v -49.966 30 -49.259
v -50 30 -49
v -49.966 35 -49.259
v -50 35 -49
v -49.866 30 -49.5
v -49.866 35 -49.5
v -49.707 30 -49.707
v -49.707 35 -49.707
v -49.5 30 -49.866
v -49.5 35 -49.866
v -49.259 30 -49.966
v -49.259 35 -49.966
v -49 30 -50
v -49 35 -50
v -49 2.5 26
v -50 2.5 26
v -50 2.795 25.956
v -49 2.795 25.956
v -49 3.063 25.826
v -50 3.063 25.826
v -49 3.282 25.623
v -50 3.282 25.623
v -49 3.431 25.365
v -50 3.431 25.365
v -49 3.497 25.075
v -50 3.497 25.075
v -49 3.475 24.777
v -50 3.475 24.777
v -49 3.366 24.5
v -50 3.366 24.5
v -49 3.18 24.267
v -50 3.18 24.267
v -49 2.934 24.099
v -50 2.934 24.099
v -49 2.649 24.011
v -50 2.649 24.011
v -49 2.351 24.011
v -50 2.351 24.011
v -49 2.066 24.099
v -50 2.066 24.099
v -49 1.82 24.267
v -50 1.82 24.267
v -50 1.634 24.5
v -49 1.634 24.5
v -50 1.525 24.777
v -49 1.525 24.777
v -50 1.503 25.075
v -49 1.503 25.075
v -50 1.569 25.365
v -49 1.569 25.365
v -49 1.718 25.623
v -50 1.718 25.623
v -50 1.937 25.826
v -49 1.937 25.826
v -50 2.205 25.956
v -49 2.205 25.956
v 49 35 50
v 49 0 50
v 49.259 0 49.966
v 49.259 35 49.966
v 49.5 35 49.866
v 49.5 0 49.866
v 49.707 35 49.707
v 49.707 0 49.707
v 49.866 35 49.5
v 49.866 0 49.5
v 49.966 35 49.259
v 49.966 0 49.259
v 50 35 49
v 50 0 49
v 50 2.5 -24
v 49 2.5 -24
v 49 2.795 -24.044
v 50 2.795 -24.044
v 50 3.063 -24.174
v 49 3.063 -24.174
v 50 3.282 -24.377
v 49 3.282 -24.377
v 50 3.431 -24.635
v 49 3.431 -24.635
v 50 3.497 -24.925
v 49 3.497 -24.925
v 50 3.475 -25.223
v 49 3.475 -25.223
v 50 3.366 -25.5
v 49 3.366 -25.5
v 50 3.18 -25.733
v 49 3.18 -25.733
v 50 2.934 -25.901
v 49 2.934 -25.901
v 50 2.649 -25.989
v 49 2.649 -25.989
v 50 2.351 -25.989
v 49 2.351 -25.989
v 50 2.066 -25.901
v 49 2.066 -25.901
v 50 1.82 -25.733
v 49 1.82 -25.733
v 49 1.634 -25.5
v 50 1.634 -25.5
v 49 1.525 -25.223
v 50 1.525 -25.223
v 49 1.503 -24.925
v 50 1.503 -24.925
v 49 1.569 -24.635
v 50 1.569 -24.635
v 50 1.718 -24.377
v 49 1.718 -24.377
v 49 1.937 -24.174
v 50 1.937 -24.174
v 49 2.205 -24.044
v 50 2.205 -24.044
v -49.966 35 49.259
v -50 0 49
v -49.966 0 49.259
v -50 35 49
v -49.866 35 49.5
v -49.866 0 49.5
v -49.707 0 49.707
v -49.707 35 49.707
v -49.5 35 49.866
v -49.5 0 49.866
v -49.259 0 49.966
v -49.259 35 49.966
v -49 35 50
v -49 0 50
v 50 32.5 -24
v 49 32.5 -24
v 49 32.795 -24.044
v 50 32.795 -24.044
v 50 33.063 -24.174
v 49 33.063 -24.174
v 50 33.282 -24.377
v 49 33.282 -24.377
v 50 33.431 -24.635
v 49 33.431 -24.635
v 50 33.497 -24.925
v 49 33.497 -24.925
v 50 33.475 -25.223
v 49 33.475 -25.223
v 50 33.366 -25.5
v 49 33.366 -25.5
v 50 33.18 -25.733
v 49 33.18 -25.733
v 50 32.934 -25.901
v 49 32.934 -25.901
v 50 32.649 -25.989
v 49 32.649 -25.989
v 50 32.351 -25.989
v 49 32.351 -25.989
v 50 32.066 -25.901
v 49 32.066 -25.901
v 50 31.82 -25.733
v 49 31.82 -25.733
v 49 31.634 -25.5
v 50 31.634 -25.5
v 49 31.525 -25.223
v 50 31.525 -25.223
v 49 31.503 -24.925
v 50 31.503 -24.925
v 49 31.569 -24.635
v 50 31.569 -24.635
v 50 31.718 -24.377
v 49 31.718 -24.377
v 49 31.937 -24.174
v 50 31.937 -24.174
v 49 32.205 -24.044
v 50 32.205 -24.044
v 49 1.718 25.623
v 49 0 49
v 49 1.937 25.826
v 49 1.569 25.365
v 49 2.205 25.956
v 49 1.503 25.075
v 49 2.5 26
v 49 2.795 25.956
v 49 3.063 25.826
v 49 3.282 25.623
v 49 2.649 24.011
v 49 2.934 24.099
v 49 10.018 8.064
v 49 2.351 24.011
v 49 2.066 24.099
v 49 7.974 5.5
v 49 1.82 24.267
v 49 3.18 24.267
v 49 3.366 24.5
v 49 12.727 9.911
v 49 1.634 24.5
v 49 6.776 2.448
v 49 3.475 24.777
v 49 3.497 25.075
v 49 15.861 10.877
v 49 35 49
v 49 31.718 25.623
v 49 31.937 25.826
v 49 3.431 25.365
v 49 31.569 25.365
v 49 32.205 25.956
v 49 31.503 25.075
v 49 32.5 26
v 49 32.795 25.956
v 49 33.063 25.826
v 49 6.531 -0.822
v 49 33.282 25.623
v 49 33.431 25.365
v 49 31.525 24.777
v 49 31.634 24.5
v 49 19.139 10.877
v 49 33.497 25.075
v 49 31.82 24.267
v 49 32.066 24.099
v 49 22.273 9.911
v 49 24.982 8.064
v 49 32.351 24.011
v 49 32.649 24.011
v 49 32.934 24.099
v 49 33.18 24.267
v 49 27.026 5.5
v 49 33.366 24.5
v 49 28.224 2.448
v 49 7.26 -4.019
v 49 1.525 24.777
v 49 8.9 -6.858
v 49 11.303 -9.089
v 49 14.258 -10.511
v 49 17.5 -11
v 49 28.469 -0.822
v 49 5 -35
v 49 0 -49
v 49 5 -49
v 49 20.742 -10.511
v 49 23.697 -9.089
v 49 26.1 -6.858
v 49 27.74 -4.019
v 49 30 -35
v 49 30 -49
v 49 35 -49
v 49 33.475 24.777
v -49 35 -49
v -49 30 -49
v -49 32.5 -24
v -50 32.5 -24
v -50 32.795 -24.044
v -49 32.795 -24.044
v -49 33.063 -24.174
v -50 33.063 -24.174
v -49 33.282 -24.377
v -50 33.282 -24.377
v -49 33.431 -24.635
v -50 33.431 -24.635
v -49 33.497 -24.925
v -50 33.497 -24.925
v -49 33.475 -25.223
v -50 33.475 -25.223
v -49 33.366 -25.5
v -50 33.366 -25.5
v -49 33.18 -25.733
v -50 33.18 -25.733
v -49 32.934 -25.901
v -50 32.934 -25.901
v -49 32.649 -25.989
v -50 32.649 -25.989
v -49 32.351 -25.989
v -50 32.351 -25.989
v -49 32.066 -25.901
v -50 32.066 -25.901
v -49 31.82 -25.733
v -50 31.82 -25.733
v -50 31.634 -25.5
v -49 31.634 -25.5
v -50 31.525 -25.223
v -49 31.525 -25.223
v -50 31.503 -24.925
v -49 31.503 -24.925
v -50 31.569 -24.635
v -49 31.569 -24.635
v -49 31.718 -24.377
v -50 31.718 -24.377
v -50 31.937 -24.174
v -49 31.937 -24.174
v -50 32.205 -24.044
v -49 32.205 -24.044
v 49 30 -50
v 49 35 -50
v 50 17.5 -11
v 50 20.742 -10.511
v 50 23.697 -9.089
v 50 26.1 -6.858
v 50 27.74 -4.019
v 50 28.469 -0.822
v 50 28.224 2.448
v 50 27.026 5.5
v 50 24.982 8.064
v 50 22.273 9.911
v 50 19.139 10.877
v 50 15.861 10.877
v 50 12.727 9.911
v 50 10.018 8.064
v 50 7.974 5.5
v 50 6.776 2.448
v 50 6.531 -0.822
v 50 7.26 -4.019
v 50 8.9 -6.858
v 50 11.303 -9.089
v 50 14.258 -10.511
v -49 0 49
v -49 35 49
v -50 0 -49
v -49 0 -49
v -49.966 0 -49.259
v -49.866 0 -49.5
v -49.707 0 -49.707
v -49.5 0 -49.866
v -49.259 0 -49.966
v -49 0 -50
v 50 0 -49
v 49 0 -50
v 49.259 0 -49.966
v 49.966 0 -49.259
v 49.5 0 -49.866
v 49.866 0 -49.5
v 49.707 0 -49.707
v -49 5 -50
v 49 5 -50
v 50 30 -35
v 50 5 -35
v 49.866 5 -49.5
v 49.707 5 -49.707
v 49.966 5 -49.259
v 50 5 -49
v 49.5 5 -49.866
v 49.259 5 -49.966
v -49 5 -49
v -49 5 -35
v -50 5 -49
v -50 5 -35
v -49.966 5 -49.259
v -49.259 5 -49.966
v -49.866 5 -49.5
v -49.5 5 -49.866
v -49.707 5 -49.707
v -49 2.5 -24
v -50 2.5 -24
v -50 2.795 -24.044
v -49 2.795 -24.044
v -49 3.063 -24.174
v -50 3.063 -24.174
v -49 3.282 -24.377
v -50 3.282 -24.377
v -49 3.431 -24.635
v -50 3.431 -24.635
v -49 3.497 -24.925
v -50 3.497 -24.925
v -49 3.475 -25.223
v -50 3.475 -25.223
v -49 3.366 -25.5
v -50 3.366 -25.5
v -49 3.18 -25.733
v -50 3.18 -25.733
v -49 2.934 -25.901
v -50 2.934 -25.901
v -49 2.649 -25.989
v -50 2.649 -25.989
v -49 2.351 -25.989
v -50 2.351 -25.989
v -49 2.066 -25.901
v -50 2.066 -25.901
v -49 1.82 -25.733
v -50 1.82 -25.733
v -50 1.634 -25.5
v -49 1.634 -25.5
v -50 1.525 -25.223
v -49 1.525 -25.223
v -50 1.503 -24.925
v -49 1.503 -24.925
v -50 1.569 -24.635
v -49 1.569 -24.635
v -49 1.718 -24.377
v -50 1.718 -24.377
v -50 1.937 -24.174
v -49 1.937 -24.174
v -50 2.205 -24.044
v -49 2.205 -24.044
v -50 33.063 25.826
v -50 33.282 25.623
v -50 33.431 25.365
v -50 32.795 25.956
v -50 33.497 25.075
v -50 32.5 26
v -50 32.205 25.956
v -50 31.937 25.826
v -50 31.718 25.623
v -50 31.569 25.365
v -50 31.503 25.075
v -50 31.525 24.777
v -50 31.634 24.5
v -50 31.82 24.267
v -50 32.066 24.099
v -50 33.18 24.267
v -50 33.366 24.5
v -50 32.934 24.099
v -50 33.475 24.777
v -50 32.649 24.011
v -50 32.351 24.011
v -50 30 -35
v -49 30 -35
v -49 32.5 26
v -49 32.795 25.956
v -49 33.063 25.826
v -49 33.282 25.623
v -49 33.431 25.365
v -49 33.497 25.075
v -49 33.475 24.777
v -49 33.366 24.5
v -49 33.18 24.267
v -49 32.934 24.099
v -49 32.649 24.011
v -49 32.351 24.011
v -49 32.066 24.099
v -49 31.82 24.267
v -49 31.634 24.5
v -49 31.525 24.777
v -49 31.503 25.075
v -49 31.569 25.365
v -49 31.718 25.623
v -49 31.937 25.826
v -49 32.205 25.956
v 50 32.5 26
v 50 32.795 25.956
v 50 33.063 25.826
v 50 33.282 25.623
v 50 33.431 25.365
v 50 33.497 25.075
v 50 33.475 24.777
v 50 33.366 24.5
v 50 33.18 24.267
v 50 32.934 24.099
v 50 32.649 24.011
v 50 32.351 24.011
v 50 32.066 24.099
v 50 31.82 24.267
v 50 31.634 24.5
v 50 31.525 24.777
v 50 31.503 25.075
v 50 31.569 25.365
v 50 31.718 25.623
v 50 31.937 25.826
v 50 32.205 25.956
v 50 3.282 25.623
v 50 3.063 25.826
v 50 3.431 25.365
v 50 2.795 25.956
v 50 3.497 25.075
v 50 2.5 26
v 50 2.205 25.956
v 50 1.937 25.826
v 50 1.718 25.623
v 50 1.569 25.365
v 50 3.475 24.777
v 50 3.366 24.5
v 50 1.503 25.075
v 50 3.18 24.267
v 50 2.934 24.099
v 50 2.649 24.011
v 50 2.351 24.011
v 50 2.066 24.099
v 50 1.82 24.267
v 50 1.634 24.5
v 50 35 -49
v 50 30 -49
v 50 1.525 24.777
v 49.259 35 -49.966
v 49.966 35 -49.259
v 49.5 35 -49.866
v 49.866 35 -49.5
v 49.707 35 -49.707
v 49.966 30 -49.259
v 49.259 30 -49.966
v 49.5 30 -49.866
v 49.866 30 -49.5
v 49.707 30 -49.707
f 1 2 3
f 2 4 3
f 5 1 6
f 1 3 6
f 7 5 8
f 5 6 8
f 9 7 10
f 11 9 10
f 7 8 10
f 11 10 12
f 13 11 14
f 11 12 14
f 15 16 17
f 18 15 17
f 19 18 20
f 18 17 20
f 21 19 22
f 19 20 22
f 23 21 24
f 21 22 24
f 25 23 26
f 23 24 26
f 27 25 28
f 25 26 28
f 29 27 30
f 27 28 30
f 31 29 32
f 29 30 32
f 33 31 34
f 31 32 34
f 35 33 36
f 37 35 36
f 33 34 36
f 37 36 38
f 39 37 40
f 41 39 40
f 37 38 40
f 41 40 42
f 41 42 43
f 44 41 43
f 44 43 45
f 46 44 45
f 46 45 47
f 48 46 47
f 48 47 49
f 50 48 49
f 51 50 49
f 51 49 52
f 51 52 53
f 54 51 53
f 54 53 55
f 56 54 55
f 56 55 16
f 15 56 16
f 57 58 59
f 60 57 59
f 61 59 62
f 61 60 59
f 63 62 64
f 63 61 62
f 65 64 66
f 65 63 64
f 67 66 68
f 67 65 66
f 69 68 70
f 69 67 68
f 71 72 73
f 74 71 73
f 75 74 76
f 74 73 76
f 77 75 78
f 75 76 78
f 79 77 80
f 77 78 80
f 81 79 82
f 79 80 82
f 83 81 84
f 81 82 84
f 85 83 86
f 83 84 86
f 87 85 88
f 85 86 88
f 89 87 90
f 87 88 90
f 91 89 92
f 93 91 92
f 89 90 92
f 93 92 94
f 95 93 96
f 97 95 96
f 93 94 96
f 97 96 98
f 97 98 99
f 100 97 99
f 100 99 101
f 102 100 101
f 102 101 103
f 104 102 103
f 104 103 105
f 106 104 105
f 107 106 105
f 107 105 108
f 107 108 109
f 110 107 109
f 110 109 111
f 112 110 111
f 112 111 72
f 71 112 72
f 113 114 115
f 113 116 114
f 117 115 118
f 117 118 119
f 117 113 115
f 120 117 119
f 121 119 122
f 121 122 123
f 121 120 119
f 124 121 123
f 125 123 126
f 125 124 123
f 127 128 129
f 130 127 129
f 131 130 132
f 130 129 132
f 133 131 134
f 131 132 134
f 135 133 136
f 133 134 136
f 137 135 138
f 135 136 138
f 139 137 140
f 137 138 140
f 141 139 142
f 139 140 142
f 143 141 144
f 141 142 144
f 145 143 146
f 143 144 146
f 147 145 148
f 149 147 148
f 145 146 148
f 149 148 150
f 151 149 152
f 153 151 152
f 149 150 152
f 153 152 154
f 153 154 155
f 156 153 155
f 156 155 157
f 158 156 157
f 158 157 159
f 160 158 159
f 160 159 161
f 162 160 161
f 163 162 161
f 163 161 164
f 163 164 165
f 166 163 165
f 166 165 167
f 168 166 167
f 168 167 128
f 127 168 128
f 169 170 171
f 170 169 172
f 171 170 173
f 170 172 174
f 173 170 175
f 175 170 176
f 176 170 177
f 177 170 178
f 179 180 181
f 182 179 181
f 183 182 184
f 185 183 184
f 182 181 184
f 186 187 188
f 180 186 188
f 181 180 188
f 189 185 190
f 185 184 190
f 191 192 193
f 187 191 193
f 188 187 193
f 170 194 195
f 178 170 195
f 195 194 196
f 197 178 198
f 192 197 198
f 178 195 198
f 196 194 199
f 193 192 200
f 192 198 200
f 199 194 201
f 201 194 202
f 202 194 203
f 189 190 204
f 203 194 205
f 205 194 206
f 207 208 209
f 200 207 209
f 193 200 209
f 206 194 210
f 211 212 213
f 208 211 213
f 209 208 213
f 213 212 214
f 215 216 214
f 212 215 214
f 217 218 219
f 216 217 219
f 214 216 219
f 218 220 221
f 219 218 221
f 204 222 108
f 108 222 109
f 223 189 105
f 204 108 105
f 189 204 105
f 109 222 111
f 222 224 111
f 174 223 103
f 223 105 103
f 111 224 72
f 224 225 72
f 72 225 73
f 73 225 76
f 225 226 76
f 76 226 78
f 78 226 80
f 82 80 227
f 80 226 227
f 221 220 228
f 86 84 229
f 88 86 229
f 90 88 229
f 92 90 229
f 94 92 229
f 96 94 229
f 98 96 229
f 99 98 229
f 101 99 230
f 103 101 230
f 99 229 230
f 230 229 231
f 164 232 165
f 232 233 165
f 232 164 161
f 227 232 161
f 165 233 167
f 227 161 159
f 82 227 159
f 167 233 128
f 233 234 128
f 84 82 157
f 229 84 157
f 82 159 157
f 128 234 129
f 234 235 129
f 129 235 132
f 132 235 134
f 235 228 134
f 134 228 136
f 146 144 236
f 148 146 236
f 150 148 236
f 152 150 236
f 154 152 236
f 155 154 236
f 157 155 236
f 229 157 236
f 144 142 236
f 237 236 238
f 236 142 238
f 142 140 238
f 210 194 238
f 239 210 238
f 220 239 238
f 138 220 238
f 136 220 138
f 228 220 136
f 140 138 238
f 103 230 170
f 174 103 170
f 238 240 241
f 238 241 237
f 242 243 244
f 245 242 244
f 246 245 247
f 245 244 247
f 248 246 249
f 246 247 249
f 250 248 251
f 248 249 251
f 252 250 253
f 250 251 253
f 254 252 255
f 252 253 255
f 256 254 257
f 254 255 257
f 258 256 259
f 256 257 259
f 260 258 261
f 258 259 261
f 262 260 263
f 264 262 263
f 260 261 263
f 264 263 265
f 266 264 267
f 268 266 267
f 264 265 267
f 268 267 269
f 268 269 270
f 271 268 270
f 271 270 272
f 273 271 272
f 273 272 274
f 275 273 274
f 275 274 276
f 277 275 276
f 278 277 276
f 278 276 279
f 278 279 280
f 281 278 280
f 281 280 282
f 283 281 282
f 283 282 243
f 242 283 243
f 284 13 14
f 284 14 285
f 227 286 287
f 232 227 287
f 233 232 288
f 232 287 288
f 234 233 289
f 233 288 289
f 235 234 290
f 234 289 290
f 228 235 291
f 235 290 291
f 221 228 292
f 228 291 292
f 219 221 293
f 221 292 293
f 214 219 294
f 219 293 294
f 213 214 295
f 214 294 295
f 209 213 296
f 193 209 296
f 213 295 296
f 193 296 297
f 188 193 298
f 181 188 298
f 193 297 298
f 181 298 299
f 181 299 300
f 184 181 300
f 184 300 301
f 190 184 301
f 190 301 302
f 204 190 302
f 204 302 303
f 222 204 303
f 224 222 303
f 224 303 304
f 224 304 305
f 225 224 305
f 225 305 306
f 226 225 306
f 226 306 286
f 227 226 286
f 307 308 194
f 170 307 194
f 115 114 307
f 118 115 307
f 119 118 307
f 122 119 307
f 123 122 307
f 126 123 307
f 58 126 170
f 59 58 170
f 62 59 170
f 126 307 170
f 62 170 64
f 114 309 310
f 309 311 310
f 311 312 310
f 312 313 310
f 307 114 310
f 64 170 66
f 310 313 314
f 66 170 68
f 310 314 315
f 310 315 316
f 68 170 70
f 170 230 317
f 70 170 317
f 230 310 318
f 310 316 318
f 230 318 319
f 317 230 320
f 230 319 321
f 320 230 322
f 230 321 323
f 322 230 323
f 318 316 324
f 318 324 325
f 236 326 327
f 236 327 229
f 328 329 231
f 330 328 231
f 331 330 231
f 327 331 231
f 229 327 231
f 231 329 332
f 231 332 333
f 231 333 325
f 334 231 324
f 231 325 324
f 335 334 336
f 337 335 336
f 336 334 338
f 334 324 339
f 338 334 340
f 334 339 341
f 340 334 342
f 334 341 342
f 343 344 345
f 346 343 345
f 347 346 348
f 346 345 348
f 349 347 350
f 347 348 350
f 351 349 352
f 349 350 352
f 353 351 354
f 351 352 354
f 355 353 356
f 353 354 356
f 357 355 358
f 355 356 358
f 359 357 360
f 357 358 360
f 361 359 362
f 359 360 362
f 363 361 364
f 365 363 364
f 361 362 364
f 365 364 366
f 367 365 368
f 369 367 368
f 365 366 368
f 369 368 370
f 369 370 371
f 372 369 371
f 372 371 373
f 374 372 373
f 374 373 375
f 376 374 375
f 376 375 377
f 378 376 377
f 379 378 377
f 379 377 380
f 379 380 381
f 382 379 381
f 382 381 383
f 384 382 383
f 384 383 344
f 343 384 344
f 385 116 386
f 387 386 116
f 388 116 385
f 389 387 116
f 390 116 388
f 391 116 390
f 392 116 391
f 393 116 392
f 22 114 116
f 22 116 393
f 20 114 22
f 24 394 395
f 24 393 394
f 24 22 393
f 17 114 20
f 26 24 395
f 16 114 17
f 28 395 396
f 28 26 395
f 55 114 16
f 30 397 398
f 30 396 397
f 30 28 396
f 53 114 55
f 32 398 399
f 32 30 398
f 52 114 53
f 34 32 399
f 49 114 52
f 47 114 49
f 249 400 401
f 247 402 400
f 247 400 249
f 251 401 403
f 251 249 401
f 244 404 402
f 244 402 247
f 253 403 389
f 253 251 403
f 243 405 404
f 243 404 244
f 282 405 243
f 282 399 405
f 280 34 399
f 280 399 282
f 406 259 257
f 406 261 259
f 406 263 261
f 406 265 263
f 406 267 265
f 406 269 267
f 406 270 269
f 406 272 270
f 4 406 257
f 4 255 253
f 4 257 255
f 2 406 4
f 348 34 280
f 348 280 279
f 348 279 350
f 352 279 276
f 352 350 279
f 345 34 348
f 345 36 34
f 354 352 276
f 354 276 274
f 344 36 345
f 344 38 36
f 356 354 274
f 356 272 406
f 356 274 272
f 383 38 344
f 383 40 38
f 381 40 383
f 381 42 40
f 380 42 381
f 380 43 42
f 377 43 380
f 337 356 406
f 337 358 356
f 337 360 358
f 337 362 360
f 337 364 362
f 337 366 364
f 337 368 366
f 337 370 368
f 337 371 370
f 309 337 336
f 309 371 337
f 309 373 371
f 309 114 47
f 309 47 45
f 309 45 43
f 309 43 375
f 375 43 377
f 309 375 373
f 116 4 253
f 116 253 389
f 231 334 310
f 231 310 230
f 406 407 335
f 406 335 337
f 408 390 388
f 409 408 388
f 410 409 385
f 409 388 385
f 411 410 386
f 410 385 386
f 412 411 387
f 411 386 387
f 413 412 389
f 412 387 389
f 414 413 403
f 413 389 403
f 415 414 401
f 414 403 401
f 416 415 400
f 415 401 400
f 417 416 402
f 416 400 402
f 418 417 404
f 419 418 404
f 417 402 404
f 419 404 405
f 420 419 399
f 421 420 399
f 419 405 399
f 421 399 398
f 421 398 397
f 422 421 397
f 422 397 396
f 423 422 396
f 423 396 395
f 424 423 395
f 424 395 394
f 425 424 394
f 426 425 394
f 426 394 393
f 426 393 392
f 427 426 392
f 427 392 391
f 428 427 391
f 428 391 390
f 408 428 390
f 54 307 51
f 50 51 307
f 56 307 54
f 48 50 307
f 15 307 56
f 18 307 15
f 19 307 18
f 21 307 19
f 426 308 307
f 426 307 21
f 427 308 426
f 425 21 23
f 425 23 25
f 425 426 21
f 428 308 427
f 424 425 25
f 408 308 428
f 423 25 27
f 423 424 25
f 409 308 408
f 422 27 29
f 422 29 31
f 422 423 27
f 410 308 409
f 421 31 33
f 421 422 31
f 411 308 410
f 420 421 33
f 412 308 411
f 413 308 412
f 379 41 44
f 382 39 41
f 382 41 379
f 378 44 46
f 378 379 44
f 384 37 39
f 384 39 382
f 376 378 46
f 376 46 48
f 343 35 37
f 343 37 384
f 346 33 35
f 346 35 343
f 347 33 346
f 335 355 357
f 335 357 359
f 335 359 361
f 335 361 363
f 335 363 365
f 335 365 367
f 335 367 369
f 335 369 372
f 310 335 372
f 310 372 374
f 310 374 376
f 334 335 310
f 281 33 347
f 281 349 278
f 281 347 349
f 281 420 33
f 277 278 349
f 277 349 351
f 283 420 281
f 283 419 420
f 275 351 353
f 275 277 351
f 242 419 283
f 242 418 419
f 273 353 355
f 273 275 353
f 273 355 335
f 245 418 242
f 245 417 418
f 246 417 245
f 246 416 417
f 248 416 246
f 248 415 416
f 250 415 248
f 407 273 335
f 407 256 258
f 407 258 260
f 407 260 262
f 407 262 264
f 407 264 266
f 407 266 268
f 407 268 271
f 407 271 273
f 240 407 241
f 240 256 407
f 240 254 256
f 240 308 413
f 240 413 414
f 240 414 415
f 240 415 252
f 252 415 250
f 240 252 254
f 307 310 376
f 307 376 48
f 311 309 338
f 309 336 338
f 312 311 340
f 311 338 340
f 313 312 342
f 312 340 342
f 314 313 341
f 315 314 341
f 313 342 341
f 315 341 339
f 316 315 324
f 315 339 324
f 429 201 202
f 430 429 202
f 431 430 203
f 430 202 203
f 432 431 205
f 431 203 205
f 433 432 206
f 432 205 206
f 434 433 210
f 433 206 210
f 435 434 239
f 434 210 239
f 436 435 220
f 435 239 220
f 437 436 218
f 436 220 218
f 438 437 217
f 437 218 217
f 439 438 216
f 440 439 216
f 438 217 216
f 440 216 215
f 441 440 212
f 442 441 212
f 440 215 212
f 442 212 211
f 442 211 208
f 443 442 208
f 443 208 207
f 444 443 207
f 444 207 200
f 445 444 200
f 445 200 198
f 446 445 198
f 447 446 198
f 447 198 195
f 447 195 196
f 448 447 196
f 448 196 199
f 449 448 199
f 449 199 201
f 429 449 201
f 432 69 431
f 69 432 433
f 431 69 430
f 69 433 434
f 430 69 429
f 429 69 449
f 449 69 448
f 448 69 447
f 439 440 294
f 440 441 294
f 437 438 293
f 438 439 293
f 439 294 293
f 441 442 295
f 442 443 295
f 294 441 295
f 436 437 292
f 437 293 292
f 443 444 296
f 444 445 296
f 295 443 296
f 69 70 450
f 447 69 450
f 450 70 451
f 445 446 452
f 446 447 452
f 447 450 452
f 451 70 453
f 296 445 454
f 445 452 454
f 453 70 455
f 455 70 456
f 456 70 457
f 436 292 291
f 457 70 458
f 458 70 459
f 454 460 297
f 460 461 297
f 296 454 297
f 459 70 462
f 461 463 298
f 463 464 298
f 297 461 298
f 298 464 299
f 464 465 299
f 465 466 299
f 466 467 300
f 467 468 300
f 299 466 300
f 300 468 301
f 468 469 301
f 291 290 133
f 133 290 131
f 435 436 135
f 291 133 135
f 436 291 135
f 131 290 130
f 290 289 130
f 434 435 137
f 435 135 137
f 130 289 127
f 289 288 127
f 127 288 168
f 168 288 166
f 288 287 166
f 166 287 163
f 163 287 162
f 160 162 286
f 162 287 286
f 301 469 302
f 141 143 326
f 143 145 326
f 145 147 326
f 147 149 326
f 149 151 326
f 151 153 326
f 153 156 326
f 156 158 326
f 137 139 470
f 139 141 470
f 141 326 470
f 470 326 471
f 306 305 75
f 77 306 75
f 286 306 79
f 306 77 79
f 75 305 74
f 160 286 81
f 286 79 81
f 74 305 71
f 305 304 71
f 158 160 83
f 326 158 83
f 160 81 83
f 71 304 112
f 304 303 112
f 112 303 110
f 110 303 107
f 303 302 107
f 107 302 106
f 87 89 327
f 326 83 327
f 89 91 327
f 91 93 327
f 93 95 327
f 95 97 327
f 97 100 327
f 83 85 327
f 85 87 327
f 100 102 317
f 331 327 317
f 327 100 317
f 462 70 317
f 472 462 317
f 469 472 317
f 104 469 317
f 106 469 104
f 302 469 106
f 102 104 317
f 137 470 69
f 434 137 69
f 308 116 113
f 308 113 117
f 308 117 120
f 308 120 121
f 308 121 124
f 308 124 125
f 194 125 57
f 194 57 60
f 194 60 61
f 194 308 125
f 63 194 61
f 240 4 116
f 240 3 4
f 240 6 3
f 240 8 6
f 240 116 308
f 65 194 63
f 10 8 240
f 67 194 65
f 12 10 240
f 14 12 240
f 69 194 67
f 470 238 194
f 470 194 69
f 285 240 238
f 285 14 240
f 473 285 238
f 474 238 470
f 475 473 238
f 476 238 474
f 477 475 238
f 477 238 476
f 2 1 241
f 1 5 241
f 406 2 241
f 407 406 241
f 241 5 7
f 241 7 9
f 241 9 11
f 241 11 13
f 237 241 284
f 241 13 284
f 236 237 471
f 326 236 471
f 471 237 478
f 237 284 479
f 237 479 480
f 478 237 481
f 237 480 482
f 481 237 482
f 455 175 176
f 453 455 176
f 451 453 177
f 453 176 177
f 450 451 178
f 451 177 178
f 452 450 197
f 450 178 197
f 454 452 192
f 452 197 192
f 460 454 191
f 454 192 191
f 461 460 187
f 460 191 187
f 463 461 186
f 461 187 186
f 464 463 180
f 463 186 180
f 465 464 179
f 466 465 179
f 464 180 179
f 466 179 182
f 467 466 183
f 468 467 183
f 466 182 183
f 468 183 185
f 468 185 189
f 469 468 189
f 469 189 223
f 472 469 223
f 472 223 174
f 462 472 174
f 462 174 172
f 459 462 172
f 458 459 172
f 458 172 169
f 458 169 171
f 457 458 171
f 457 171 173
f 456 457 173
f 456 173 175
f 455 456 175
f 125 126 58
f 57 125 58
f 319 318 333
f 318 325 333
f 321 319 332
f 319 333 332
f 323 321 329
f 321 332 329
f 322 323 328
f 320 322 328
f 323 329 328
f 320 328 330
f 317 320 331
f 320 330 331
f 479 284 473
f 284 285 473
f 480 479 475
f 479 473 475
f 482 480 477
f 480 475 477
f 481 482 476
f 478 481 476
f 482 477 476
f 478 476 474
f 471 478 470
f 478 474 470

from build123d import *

# Parameters (mm, degrees)
SKETCH1_W           = 100
SKETCH1_H           = 100
BOSS_EXTRUDE1_DEPTH = 35
SKETCH2_W           = 98
SKETCH2_H           = 98
CUT_EXTRUDE1_DEPTH  = 35
SKETCH5_W           = 50
SKETCH5_H           = 25
CUT_EXTRUDE2_DEPTH  = 15
SKETCH6_R           = 1
CUT_EXTRUDE4_DEPTH  = 114
SKETCH7_R           = 11
CUT_EXTRUDE5_DEPTH  = 10
FILLET1_R           = 1


with BuildPart() as part:
    # Sketch1 → Boss-Extrude1 (new body)
    with BuildSketch(Plane(origin=(0, 0, 0), x_dir=(1, 0, 0), z_dir=(0, 1, 0))):
        Rectangle(SKETCH1_W, SKETCH1_H)
    extrude(amount=BOSS_EXTRUDE1_DEPTH)

    # Sketch2 → Cut-Extrude1 (cut)
    with BuildSketch(Plane(origin=(0, 35, 0), x_dir=(1, 0, 0), z_dir=(0, 1, 0))):
        Rectangle(SKETCH2_W, SKETCH2_H)
    extrude(amount=-CUT_EXTRUDE1_DEPTH, mode=Mode.SUBTRACT)

    # Sketch5 → Cut-Extrude2 (cut)
    with BuildSketch(Plane(origin=(0, 0, -50), x_dir=(-1, 0, 0), z_dir=(0, 0, -1))):
        with Locations((-25, 17.5)):
            Rectangle(SKETCH5_W, SKETCH5_H)
        with Locations((25, 17.5)):
            Rectangle(SKETCH5_W, SKETCH5_H)
    extrude(amount=-CUT_EXTRUDE2_DEPTH, mode=Mode.SUBTRACT)

    # Sketch6 → Cut-Extrude4 (cut)
    with BuildSketch(Plane.ZY.offset(50)):
        with Locations((-25, 32.5)):
            Circle(SKETCH6_R)
        with Locations((25, 32.5)):
            Circle(SKETCH6_R)
        with Locations((-25, 2.5)):
            Circle(SKETCH6_R)
        with Locations((25, 2.5)):
            Circle(SKETCH6_R)
    extrude(amount=-CUT_EXTRUDE4_DEPTH, mode=Mode.SUBTRACT)

    # Sketch7 → Cut-Extrude5 (cut)
    with BuildSketch(Plane(origin=(50, 0, 0), x_dir=(0, 0, -1), z_dir=(1, 0, 0))):
        with Locations((0, 17.5)):
            Circle(SKETCH7_R)
    extrude(amount=-CUT_EXTRUDE5_DEPTH, mode=Mode.SUBTRACT)

    # Fillet1
    fillet1_edges = [part.edges().sort_by_distance(p)[0] for p in [
        (-50, 2.5, -50),
        (50, 2.5, -50),
        (50, 17.5, 50),
        (-50, 17.5, 50),
        (-50, 32.5, -50),
        (50, 32.5, -50),
    ]]
    fillet(fillet1_edges, radius=FILLET1_R)


solid = part.part
